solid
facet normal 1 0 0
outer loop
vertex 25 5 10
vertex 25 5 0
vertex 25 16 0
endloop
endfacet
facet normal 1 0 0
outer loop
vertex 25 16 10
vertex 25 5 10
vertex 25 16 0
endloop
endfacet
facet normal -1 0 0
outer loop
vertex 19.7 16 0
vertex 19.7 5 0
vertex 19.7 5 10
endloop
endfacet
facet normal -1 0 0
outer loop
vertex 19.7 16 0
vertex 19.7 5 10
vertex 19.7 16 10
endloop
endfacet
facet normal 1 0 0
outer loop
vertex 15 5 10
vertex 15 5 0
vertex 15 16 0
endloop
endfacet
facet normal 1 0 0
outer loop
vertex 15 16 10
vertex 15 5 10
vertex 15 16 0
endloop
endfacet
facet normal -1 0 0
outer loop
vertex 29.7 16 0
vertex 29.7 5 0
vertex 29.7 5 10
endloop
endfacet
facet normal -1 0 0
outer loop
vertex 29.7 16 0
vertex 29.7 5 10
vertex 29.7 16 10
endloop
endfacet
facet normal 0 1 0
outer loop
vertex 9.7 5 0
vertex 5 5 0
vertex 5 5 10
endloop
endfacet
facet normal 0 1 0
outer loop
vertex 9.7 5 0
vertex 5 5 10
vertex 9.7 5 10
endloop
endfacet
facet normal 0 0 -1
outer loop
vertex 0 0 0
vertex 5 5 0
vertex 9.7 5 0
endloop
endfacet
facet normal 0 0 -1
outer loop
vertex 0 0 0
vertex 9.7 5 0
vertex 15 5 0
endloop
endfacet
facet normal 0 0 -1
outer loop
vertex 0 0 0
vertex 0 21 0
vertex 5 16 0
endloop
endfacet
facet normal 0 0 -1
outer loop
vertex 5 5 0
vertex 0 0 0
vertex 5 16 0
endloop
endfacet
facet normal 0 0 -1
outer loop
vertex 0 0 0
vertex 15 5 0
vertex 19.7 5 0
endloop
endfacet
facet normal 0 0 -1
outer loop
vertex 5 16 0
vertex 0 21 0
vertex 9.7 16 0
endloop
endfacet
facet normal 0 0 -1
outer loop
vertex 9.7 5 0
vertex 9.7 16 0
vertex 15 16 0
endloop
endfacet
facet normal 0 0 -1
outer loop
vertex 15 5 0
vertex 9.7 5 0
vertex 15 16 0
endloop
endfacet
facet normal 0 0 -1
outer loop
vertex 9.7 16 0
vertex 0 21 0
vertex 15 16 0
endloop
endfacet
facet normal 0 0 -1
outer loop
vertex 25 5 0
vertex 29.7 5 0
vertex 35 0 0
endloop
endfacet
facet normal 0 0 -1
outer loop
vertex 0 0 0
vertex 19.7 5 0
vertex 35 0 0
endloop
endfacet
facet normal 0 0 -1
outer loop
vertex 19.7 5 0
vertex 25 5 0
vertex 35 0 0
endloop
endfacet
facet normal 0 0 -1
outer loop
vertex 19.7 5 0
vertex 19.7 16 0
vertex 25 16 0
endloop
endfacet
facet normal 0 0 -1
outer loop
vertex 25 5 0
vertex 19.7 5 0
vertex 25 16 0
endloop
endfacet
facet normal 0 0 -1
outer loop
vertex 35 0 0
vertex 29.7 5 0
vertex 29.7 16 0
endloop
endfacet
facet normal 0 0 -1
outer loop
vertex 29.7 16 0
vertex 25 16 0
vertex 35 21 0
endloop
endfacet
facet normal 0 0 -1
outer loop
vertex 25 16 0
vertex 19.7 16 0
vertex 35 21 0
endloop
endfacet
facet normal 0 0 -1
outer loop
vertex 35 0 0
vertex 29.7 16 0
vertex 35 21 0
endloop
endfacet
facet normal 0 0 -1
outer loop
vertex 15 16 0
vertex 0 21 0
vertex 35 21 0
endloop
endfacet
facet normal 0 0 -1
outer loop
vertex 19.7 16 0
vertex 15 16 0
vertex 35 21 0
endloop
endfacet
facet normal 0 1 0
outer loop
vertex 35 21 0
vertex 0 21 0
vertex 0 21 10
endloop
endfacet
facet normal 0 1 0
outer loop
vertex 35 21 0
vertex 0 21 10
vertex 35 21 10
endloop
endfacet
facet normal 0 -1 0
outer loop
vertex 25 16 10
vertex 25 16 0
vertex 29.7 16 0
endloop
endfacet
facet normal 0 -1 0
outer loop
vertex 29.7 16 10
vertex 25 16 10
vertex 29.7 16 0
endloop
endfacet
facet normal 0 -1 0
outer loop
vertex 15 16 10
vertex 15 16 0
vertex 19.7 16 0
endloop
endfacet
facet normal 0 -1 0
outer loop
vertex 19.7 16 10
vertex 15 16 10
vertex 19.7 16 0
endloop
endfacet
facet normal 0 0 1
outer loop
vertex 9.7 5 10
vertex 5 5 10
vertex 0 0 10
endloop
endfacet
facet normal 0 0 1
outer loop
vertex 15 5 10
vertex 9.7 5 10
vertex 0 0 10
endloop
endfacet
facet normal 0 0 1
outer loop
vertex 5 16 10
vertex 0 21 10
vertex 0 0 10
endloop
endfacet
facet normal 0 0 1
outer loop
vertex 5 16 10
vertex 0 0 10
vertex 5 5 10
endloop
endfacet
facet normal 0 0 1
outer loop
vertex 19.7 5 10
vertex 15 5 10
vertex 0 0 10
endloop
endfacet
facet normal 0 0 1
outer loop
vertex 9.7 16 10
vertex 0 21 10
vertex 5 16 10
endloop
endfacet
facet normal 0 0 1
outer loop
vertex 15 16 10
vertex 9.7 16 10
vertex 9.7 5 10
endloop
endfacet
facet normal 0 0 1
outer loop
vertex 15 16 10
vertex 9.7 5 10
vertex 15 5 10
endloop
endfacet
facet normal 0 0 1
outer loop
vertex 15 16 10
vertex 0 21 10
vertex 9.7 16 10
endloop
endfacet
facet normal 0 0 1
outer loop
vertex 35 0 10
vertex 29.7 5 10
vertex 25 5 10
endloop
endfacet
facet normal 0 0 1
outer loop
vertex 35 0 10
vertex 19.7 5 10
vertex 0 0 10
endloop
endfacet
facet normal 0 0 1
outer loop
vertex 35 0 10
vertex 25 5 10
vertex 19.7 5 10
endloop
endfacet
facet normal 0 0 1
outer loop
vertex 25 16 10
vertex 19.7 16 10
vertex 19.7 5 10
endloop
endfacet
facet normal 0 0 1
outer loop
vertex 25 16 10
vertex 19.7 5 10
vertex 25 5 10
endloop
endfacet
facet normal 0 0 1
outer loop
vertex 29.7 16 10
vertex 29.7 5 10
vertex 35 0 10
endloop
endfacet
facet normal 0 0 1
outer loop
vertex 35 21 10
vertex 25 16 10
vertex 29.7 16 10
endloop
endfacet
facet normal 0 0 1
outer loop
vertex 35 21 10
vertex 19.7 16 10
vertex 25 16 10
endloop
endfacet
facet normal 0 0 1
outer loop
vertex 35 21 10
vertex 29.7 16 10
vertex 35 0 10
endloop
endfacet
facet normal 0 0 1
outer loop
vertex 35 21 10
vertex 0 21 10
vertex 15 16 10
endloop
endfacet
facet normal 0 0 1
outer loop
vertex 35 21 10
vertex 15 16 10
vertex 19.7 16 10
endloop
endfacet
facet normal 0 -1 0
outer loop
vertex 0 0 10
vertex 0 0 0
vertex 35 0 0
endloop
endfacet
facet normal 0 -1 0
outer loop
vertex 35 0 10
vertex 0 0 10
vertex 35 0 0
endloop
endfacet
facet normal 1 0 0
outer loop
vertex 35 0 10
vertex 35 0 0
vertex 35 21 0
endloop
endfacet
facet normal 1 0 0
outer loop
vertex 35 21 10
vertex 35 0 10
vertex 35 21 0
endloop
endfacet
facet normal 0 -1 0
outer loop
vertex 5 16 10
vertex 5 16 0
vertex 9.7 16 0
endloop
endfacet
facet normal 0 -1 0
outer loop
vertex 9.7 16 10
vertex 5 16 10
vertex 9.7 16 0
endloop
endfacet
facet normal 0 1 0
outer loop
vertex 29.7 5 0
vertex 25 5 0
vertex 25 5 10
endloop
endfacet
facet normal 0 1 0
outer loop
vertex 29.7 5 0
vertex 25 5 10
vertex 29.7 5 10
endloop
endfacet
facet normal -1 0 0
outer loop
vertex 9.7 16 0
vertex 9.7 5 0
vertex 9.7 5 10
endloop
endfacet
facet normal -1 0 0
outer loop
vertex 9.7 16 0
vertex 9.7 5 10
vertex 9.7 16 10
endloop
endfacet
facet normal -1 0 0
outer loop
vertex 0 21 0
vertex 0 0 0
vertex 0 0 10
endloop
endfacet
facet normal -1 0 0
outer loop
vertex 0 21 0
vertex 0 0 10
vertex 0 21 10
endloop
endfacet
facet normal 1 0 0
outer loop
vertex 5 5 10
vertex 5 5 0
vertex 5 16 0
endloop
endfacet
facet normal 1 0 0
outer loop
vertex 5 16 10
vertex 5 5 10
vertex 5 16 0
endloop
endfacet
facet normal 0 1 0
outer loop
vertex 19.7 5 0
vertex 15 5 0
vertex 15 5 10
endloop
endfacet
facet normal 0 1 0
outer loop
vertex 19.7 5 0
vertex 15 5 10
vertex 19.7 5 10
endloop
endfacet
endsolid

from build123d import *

# Parameters (mm, degrees)
BOX002_W     = 4.7
BOX002_H     = 11
BOX002_DEPTH = 10
BOX003_W     = 4.7
BOX003_H     = 11
BOX003_DEPTH = 10
BOX001_W     = 4.7
BOX001_H     = 11
BOX001_DEPTH = 10
BOX_W        = 35
BOX_H        = 21
BOX_DEPTH    = 10


with BuildPart() as cubo002:
    # Box002 → Box002 (new body)
    with BuildSketch(Plane(origin=(15, 5, 0), x_dir=(1, 0, 0), z_dir=(0, 0, 1))):
        with Locations((2.35, 5.5)):
            Rectangle(BOX002_W, BOX002_H)
    extrude(amount=BOX002_DEPTH)


with BuildPart() as cubo003:
    # Box003 → Box003 (new body)
    with BuildSketch(Plane(origin=(25, 5, 0), x_dir=(1, 0, 0), z_dir=(0, 0, 1))):
        with Locations((2.35, 5.5)):
            Rectangle(BOX003_W, BOX003_H)
    extrude(amount=BOX003_DEPTH)


with BuildPart() as cubo001:
    # Box001 → Box001 (new body)
    with BuildSketch(Plane(origin=(5, 5, 0), x_dir=(1, 0, 0), z_dir=(0, 0, 1))):
        with Locations((2.35, 5.5)):
            Rectangle(BOX001_W, BOX001_H)
    extrude(amount=BOX001_DEPTH)


with BuildPart() as cut002:
    # Box → Box (new body)
    with BuildSketch(Plane.XY):
        with Locations((17.5, 10.5)):
            Rectangle(BOX_W, BOX_H)
    extrude(amount=BOX_DEPTH)

    # Cut: cut Cubo001
    add(cubo001.part, mode=Mode.SUBTRACT)

    # Cut001: cut Cubo003
    add(cubo003.part, mode=Mode.SUBTRACT)

    # Cut002: cut Cubo002
    add(cubo002.part, mode=Mode.SUBTRACT)


solid = cut002.part
